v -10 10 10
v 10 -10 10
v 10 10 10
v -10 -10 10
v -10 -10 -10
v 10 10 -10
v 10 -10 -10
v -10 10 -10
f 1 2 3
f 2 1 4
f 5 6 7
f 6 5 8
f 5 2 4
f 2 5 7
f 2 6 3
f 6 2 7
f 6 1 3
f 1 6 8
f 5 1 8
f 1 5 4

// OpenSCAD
scale(v = [2,2,2]) { 
	cube(size=[10, 10, 10], center=true);
}
